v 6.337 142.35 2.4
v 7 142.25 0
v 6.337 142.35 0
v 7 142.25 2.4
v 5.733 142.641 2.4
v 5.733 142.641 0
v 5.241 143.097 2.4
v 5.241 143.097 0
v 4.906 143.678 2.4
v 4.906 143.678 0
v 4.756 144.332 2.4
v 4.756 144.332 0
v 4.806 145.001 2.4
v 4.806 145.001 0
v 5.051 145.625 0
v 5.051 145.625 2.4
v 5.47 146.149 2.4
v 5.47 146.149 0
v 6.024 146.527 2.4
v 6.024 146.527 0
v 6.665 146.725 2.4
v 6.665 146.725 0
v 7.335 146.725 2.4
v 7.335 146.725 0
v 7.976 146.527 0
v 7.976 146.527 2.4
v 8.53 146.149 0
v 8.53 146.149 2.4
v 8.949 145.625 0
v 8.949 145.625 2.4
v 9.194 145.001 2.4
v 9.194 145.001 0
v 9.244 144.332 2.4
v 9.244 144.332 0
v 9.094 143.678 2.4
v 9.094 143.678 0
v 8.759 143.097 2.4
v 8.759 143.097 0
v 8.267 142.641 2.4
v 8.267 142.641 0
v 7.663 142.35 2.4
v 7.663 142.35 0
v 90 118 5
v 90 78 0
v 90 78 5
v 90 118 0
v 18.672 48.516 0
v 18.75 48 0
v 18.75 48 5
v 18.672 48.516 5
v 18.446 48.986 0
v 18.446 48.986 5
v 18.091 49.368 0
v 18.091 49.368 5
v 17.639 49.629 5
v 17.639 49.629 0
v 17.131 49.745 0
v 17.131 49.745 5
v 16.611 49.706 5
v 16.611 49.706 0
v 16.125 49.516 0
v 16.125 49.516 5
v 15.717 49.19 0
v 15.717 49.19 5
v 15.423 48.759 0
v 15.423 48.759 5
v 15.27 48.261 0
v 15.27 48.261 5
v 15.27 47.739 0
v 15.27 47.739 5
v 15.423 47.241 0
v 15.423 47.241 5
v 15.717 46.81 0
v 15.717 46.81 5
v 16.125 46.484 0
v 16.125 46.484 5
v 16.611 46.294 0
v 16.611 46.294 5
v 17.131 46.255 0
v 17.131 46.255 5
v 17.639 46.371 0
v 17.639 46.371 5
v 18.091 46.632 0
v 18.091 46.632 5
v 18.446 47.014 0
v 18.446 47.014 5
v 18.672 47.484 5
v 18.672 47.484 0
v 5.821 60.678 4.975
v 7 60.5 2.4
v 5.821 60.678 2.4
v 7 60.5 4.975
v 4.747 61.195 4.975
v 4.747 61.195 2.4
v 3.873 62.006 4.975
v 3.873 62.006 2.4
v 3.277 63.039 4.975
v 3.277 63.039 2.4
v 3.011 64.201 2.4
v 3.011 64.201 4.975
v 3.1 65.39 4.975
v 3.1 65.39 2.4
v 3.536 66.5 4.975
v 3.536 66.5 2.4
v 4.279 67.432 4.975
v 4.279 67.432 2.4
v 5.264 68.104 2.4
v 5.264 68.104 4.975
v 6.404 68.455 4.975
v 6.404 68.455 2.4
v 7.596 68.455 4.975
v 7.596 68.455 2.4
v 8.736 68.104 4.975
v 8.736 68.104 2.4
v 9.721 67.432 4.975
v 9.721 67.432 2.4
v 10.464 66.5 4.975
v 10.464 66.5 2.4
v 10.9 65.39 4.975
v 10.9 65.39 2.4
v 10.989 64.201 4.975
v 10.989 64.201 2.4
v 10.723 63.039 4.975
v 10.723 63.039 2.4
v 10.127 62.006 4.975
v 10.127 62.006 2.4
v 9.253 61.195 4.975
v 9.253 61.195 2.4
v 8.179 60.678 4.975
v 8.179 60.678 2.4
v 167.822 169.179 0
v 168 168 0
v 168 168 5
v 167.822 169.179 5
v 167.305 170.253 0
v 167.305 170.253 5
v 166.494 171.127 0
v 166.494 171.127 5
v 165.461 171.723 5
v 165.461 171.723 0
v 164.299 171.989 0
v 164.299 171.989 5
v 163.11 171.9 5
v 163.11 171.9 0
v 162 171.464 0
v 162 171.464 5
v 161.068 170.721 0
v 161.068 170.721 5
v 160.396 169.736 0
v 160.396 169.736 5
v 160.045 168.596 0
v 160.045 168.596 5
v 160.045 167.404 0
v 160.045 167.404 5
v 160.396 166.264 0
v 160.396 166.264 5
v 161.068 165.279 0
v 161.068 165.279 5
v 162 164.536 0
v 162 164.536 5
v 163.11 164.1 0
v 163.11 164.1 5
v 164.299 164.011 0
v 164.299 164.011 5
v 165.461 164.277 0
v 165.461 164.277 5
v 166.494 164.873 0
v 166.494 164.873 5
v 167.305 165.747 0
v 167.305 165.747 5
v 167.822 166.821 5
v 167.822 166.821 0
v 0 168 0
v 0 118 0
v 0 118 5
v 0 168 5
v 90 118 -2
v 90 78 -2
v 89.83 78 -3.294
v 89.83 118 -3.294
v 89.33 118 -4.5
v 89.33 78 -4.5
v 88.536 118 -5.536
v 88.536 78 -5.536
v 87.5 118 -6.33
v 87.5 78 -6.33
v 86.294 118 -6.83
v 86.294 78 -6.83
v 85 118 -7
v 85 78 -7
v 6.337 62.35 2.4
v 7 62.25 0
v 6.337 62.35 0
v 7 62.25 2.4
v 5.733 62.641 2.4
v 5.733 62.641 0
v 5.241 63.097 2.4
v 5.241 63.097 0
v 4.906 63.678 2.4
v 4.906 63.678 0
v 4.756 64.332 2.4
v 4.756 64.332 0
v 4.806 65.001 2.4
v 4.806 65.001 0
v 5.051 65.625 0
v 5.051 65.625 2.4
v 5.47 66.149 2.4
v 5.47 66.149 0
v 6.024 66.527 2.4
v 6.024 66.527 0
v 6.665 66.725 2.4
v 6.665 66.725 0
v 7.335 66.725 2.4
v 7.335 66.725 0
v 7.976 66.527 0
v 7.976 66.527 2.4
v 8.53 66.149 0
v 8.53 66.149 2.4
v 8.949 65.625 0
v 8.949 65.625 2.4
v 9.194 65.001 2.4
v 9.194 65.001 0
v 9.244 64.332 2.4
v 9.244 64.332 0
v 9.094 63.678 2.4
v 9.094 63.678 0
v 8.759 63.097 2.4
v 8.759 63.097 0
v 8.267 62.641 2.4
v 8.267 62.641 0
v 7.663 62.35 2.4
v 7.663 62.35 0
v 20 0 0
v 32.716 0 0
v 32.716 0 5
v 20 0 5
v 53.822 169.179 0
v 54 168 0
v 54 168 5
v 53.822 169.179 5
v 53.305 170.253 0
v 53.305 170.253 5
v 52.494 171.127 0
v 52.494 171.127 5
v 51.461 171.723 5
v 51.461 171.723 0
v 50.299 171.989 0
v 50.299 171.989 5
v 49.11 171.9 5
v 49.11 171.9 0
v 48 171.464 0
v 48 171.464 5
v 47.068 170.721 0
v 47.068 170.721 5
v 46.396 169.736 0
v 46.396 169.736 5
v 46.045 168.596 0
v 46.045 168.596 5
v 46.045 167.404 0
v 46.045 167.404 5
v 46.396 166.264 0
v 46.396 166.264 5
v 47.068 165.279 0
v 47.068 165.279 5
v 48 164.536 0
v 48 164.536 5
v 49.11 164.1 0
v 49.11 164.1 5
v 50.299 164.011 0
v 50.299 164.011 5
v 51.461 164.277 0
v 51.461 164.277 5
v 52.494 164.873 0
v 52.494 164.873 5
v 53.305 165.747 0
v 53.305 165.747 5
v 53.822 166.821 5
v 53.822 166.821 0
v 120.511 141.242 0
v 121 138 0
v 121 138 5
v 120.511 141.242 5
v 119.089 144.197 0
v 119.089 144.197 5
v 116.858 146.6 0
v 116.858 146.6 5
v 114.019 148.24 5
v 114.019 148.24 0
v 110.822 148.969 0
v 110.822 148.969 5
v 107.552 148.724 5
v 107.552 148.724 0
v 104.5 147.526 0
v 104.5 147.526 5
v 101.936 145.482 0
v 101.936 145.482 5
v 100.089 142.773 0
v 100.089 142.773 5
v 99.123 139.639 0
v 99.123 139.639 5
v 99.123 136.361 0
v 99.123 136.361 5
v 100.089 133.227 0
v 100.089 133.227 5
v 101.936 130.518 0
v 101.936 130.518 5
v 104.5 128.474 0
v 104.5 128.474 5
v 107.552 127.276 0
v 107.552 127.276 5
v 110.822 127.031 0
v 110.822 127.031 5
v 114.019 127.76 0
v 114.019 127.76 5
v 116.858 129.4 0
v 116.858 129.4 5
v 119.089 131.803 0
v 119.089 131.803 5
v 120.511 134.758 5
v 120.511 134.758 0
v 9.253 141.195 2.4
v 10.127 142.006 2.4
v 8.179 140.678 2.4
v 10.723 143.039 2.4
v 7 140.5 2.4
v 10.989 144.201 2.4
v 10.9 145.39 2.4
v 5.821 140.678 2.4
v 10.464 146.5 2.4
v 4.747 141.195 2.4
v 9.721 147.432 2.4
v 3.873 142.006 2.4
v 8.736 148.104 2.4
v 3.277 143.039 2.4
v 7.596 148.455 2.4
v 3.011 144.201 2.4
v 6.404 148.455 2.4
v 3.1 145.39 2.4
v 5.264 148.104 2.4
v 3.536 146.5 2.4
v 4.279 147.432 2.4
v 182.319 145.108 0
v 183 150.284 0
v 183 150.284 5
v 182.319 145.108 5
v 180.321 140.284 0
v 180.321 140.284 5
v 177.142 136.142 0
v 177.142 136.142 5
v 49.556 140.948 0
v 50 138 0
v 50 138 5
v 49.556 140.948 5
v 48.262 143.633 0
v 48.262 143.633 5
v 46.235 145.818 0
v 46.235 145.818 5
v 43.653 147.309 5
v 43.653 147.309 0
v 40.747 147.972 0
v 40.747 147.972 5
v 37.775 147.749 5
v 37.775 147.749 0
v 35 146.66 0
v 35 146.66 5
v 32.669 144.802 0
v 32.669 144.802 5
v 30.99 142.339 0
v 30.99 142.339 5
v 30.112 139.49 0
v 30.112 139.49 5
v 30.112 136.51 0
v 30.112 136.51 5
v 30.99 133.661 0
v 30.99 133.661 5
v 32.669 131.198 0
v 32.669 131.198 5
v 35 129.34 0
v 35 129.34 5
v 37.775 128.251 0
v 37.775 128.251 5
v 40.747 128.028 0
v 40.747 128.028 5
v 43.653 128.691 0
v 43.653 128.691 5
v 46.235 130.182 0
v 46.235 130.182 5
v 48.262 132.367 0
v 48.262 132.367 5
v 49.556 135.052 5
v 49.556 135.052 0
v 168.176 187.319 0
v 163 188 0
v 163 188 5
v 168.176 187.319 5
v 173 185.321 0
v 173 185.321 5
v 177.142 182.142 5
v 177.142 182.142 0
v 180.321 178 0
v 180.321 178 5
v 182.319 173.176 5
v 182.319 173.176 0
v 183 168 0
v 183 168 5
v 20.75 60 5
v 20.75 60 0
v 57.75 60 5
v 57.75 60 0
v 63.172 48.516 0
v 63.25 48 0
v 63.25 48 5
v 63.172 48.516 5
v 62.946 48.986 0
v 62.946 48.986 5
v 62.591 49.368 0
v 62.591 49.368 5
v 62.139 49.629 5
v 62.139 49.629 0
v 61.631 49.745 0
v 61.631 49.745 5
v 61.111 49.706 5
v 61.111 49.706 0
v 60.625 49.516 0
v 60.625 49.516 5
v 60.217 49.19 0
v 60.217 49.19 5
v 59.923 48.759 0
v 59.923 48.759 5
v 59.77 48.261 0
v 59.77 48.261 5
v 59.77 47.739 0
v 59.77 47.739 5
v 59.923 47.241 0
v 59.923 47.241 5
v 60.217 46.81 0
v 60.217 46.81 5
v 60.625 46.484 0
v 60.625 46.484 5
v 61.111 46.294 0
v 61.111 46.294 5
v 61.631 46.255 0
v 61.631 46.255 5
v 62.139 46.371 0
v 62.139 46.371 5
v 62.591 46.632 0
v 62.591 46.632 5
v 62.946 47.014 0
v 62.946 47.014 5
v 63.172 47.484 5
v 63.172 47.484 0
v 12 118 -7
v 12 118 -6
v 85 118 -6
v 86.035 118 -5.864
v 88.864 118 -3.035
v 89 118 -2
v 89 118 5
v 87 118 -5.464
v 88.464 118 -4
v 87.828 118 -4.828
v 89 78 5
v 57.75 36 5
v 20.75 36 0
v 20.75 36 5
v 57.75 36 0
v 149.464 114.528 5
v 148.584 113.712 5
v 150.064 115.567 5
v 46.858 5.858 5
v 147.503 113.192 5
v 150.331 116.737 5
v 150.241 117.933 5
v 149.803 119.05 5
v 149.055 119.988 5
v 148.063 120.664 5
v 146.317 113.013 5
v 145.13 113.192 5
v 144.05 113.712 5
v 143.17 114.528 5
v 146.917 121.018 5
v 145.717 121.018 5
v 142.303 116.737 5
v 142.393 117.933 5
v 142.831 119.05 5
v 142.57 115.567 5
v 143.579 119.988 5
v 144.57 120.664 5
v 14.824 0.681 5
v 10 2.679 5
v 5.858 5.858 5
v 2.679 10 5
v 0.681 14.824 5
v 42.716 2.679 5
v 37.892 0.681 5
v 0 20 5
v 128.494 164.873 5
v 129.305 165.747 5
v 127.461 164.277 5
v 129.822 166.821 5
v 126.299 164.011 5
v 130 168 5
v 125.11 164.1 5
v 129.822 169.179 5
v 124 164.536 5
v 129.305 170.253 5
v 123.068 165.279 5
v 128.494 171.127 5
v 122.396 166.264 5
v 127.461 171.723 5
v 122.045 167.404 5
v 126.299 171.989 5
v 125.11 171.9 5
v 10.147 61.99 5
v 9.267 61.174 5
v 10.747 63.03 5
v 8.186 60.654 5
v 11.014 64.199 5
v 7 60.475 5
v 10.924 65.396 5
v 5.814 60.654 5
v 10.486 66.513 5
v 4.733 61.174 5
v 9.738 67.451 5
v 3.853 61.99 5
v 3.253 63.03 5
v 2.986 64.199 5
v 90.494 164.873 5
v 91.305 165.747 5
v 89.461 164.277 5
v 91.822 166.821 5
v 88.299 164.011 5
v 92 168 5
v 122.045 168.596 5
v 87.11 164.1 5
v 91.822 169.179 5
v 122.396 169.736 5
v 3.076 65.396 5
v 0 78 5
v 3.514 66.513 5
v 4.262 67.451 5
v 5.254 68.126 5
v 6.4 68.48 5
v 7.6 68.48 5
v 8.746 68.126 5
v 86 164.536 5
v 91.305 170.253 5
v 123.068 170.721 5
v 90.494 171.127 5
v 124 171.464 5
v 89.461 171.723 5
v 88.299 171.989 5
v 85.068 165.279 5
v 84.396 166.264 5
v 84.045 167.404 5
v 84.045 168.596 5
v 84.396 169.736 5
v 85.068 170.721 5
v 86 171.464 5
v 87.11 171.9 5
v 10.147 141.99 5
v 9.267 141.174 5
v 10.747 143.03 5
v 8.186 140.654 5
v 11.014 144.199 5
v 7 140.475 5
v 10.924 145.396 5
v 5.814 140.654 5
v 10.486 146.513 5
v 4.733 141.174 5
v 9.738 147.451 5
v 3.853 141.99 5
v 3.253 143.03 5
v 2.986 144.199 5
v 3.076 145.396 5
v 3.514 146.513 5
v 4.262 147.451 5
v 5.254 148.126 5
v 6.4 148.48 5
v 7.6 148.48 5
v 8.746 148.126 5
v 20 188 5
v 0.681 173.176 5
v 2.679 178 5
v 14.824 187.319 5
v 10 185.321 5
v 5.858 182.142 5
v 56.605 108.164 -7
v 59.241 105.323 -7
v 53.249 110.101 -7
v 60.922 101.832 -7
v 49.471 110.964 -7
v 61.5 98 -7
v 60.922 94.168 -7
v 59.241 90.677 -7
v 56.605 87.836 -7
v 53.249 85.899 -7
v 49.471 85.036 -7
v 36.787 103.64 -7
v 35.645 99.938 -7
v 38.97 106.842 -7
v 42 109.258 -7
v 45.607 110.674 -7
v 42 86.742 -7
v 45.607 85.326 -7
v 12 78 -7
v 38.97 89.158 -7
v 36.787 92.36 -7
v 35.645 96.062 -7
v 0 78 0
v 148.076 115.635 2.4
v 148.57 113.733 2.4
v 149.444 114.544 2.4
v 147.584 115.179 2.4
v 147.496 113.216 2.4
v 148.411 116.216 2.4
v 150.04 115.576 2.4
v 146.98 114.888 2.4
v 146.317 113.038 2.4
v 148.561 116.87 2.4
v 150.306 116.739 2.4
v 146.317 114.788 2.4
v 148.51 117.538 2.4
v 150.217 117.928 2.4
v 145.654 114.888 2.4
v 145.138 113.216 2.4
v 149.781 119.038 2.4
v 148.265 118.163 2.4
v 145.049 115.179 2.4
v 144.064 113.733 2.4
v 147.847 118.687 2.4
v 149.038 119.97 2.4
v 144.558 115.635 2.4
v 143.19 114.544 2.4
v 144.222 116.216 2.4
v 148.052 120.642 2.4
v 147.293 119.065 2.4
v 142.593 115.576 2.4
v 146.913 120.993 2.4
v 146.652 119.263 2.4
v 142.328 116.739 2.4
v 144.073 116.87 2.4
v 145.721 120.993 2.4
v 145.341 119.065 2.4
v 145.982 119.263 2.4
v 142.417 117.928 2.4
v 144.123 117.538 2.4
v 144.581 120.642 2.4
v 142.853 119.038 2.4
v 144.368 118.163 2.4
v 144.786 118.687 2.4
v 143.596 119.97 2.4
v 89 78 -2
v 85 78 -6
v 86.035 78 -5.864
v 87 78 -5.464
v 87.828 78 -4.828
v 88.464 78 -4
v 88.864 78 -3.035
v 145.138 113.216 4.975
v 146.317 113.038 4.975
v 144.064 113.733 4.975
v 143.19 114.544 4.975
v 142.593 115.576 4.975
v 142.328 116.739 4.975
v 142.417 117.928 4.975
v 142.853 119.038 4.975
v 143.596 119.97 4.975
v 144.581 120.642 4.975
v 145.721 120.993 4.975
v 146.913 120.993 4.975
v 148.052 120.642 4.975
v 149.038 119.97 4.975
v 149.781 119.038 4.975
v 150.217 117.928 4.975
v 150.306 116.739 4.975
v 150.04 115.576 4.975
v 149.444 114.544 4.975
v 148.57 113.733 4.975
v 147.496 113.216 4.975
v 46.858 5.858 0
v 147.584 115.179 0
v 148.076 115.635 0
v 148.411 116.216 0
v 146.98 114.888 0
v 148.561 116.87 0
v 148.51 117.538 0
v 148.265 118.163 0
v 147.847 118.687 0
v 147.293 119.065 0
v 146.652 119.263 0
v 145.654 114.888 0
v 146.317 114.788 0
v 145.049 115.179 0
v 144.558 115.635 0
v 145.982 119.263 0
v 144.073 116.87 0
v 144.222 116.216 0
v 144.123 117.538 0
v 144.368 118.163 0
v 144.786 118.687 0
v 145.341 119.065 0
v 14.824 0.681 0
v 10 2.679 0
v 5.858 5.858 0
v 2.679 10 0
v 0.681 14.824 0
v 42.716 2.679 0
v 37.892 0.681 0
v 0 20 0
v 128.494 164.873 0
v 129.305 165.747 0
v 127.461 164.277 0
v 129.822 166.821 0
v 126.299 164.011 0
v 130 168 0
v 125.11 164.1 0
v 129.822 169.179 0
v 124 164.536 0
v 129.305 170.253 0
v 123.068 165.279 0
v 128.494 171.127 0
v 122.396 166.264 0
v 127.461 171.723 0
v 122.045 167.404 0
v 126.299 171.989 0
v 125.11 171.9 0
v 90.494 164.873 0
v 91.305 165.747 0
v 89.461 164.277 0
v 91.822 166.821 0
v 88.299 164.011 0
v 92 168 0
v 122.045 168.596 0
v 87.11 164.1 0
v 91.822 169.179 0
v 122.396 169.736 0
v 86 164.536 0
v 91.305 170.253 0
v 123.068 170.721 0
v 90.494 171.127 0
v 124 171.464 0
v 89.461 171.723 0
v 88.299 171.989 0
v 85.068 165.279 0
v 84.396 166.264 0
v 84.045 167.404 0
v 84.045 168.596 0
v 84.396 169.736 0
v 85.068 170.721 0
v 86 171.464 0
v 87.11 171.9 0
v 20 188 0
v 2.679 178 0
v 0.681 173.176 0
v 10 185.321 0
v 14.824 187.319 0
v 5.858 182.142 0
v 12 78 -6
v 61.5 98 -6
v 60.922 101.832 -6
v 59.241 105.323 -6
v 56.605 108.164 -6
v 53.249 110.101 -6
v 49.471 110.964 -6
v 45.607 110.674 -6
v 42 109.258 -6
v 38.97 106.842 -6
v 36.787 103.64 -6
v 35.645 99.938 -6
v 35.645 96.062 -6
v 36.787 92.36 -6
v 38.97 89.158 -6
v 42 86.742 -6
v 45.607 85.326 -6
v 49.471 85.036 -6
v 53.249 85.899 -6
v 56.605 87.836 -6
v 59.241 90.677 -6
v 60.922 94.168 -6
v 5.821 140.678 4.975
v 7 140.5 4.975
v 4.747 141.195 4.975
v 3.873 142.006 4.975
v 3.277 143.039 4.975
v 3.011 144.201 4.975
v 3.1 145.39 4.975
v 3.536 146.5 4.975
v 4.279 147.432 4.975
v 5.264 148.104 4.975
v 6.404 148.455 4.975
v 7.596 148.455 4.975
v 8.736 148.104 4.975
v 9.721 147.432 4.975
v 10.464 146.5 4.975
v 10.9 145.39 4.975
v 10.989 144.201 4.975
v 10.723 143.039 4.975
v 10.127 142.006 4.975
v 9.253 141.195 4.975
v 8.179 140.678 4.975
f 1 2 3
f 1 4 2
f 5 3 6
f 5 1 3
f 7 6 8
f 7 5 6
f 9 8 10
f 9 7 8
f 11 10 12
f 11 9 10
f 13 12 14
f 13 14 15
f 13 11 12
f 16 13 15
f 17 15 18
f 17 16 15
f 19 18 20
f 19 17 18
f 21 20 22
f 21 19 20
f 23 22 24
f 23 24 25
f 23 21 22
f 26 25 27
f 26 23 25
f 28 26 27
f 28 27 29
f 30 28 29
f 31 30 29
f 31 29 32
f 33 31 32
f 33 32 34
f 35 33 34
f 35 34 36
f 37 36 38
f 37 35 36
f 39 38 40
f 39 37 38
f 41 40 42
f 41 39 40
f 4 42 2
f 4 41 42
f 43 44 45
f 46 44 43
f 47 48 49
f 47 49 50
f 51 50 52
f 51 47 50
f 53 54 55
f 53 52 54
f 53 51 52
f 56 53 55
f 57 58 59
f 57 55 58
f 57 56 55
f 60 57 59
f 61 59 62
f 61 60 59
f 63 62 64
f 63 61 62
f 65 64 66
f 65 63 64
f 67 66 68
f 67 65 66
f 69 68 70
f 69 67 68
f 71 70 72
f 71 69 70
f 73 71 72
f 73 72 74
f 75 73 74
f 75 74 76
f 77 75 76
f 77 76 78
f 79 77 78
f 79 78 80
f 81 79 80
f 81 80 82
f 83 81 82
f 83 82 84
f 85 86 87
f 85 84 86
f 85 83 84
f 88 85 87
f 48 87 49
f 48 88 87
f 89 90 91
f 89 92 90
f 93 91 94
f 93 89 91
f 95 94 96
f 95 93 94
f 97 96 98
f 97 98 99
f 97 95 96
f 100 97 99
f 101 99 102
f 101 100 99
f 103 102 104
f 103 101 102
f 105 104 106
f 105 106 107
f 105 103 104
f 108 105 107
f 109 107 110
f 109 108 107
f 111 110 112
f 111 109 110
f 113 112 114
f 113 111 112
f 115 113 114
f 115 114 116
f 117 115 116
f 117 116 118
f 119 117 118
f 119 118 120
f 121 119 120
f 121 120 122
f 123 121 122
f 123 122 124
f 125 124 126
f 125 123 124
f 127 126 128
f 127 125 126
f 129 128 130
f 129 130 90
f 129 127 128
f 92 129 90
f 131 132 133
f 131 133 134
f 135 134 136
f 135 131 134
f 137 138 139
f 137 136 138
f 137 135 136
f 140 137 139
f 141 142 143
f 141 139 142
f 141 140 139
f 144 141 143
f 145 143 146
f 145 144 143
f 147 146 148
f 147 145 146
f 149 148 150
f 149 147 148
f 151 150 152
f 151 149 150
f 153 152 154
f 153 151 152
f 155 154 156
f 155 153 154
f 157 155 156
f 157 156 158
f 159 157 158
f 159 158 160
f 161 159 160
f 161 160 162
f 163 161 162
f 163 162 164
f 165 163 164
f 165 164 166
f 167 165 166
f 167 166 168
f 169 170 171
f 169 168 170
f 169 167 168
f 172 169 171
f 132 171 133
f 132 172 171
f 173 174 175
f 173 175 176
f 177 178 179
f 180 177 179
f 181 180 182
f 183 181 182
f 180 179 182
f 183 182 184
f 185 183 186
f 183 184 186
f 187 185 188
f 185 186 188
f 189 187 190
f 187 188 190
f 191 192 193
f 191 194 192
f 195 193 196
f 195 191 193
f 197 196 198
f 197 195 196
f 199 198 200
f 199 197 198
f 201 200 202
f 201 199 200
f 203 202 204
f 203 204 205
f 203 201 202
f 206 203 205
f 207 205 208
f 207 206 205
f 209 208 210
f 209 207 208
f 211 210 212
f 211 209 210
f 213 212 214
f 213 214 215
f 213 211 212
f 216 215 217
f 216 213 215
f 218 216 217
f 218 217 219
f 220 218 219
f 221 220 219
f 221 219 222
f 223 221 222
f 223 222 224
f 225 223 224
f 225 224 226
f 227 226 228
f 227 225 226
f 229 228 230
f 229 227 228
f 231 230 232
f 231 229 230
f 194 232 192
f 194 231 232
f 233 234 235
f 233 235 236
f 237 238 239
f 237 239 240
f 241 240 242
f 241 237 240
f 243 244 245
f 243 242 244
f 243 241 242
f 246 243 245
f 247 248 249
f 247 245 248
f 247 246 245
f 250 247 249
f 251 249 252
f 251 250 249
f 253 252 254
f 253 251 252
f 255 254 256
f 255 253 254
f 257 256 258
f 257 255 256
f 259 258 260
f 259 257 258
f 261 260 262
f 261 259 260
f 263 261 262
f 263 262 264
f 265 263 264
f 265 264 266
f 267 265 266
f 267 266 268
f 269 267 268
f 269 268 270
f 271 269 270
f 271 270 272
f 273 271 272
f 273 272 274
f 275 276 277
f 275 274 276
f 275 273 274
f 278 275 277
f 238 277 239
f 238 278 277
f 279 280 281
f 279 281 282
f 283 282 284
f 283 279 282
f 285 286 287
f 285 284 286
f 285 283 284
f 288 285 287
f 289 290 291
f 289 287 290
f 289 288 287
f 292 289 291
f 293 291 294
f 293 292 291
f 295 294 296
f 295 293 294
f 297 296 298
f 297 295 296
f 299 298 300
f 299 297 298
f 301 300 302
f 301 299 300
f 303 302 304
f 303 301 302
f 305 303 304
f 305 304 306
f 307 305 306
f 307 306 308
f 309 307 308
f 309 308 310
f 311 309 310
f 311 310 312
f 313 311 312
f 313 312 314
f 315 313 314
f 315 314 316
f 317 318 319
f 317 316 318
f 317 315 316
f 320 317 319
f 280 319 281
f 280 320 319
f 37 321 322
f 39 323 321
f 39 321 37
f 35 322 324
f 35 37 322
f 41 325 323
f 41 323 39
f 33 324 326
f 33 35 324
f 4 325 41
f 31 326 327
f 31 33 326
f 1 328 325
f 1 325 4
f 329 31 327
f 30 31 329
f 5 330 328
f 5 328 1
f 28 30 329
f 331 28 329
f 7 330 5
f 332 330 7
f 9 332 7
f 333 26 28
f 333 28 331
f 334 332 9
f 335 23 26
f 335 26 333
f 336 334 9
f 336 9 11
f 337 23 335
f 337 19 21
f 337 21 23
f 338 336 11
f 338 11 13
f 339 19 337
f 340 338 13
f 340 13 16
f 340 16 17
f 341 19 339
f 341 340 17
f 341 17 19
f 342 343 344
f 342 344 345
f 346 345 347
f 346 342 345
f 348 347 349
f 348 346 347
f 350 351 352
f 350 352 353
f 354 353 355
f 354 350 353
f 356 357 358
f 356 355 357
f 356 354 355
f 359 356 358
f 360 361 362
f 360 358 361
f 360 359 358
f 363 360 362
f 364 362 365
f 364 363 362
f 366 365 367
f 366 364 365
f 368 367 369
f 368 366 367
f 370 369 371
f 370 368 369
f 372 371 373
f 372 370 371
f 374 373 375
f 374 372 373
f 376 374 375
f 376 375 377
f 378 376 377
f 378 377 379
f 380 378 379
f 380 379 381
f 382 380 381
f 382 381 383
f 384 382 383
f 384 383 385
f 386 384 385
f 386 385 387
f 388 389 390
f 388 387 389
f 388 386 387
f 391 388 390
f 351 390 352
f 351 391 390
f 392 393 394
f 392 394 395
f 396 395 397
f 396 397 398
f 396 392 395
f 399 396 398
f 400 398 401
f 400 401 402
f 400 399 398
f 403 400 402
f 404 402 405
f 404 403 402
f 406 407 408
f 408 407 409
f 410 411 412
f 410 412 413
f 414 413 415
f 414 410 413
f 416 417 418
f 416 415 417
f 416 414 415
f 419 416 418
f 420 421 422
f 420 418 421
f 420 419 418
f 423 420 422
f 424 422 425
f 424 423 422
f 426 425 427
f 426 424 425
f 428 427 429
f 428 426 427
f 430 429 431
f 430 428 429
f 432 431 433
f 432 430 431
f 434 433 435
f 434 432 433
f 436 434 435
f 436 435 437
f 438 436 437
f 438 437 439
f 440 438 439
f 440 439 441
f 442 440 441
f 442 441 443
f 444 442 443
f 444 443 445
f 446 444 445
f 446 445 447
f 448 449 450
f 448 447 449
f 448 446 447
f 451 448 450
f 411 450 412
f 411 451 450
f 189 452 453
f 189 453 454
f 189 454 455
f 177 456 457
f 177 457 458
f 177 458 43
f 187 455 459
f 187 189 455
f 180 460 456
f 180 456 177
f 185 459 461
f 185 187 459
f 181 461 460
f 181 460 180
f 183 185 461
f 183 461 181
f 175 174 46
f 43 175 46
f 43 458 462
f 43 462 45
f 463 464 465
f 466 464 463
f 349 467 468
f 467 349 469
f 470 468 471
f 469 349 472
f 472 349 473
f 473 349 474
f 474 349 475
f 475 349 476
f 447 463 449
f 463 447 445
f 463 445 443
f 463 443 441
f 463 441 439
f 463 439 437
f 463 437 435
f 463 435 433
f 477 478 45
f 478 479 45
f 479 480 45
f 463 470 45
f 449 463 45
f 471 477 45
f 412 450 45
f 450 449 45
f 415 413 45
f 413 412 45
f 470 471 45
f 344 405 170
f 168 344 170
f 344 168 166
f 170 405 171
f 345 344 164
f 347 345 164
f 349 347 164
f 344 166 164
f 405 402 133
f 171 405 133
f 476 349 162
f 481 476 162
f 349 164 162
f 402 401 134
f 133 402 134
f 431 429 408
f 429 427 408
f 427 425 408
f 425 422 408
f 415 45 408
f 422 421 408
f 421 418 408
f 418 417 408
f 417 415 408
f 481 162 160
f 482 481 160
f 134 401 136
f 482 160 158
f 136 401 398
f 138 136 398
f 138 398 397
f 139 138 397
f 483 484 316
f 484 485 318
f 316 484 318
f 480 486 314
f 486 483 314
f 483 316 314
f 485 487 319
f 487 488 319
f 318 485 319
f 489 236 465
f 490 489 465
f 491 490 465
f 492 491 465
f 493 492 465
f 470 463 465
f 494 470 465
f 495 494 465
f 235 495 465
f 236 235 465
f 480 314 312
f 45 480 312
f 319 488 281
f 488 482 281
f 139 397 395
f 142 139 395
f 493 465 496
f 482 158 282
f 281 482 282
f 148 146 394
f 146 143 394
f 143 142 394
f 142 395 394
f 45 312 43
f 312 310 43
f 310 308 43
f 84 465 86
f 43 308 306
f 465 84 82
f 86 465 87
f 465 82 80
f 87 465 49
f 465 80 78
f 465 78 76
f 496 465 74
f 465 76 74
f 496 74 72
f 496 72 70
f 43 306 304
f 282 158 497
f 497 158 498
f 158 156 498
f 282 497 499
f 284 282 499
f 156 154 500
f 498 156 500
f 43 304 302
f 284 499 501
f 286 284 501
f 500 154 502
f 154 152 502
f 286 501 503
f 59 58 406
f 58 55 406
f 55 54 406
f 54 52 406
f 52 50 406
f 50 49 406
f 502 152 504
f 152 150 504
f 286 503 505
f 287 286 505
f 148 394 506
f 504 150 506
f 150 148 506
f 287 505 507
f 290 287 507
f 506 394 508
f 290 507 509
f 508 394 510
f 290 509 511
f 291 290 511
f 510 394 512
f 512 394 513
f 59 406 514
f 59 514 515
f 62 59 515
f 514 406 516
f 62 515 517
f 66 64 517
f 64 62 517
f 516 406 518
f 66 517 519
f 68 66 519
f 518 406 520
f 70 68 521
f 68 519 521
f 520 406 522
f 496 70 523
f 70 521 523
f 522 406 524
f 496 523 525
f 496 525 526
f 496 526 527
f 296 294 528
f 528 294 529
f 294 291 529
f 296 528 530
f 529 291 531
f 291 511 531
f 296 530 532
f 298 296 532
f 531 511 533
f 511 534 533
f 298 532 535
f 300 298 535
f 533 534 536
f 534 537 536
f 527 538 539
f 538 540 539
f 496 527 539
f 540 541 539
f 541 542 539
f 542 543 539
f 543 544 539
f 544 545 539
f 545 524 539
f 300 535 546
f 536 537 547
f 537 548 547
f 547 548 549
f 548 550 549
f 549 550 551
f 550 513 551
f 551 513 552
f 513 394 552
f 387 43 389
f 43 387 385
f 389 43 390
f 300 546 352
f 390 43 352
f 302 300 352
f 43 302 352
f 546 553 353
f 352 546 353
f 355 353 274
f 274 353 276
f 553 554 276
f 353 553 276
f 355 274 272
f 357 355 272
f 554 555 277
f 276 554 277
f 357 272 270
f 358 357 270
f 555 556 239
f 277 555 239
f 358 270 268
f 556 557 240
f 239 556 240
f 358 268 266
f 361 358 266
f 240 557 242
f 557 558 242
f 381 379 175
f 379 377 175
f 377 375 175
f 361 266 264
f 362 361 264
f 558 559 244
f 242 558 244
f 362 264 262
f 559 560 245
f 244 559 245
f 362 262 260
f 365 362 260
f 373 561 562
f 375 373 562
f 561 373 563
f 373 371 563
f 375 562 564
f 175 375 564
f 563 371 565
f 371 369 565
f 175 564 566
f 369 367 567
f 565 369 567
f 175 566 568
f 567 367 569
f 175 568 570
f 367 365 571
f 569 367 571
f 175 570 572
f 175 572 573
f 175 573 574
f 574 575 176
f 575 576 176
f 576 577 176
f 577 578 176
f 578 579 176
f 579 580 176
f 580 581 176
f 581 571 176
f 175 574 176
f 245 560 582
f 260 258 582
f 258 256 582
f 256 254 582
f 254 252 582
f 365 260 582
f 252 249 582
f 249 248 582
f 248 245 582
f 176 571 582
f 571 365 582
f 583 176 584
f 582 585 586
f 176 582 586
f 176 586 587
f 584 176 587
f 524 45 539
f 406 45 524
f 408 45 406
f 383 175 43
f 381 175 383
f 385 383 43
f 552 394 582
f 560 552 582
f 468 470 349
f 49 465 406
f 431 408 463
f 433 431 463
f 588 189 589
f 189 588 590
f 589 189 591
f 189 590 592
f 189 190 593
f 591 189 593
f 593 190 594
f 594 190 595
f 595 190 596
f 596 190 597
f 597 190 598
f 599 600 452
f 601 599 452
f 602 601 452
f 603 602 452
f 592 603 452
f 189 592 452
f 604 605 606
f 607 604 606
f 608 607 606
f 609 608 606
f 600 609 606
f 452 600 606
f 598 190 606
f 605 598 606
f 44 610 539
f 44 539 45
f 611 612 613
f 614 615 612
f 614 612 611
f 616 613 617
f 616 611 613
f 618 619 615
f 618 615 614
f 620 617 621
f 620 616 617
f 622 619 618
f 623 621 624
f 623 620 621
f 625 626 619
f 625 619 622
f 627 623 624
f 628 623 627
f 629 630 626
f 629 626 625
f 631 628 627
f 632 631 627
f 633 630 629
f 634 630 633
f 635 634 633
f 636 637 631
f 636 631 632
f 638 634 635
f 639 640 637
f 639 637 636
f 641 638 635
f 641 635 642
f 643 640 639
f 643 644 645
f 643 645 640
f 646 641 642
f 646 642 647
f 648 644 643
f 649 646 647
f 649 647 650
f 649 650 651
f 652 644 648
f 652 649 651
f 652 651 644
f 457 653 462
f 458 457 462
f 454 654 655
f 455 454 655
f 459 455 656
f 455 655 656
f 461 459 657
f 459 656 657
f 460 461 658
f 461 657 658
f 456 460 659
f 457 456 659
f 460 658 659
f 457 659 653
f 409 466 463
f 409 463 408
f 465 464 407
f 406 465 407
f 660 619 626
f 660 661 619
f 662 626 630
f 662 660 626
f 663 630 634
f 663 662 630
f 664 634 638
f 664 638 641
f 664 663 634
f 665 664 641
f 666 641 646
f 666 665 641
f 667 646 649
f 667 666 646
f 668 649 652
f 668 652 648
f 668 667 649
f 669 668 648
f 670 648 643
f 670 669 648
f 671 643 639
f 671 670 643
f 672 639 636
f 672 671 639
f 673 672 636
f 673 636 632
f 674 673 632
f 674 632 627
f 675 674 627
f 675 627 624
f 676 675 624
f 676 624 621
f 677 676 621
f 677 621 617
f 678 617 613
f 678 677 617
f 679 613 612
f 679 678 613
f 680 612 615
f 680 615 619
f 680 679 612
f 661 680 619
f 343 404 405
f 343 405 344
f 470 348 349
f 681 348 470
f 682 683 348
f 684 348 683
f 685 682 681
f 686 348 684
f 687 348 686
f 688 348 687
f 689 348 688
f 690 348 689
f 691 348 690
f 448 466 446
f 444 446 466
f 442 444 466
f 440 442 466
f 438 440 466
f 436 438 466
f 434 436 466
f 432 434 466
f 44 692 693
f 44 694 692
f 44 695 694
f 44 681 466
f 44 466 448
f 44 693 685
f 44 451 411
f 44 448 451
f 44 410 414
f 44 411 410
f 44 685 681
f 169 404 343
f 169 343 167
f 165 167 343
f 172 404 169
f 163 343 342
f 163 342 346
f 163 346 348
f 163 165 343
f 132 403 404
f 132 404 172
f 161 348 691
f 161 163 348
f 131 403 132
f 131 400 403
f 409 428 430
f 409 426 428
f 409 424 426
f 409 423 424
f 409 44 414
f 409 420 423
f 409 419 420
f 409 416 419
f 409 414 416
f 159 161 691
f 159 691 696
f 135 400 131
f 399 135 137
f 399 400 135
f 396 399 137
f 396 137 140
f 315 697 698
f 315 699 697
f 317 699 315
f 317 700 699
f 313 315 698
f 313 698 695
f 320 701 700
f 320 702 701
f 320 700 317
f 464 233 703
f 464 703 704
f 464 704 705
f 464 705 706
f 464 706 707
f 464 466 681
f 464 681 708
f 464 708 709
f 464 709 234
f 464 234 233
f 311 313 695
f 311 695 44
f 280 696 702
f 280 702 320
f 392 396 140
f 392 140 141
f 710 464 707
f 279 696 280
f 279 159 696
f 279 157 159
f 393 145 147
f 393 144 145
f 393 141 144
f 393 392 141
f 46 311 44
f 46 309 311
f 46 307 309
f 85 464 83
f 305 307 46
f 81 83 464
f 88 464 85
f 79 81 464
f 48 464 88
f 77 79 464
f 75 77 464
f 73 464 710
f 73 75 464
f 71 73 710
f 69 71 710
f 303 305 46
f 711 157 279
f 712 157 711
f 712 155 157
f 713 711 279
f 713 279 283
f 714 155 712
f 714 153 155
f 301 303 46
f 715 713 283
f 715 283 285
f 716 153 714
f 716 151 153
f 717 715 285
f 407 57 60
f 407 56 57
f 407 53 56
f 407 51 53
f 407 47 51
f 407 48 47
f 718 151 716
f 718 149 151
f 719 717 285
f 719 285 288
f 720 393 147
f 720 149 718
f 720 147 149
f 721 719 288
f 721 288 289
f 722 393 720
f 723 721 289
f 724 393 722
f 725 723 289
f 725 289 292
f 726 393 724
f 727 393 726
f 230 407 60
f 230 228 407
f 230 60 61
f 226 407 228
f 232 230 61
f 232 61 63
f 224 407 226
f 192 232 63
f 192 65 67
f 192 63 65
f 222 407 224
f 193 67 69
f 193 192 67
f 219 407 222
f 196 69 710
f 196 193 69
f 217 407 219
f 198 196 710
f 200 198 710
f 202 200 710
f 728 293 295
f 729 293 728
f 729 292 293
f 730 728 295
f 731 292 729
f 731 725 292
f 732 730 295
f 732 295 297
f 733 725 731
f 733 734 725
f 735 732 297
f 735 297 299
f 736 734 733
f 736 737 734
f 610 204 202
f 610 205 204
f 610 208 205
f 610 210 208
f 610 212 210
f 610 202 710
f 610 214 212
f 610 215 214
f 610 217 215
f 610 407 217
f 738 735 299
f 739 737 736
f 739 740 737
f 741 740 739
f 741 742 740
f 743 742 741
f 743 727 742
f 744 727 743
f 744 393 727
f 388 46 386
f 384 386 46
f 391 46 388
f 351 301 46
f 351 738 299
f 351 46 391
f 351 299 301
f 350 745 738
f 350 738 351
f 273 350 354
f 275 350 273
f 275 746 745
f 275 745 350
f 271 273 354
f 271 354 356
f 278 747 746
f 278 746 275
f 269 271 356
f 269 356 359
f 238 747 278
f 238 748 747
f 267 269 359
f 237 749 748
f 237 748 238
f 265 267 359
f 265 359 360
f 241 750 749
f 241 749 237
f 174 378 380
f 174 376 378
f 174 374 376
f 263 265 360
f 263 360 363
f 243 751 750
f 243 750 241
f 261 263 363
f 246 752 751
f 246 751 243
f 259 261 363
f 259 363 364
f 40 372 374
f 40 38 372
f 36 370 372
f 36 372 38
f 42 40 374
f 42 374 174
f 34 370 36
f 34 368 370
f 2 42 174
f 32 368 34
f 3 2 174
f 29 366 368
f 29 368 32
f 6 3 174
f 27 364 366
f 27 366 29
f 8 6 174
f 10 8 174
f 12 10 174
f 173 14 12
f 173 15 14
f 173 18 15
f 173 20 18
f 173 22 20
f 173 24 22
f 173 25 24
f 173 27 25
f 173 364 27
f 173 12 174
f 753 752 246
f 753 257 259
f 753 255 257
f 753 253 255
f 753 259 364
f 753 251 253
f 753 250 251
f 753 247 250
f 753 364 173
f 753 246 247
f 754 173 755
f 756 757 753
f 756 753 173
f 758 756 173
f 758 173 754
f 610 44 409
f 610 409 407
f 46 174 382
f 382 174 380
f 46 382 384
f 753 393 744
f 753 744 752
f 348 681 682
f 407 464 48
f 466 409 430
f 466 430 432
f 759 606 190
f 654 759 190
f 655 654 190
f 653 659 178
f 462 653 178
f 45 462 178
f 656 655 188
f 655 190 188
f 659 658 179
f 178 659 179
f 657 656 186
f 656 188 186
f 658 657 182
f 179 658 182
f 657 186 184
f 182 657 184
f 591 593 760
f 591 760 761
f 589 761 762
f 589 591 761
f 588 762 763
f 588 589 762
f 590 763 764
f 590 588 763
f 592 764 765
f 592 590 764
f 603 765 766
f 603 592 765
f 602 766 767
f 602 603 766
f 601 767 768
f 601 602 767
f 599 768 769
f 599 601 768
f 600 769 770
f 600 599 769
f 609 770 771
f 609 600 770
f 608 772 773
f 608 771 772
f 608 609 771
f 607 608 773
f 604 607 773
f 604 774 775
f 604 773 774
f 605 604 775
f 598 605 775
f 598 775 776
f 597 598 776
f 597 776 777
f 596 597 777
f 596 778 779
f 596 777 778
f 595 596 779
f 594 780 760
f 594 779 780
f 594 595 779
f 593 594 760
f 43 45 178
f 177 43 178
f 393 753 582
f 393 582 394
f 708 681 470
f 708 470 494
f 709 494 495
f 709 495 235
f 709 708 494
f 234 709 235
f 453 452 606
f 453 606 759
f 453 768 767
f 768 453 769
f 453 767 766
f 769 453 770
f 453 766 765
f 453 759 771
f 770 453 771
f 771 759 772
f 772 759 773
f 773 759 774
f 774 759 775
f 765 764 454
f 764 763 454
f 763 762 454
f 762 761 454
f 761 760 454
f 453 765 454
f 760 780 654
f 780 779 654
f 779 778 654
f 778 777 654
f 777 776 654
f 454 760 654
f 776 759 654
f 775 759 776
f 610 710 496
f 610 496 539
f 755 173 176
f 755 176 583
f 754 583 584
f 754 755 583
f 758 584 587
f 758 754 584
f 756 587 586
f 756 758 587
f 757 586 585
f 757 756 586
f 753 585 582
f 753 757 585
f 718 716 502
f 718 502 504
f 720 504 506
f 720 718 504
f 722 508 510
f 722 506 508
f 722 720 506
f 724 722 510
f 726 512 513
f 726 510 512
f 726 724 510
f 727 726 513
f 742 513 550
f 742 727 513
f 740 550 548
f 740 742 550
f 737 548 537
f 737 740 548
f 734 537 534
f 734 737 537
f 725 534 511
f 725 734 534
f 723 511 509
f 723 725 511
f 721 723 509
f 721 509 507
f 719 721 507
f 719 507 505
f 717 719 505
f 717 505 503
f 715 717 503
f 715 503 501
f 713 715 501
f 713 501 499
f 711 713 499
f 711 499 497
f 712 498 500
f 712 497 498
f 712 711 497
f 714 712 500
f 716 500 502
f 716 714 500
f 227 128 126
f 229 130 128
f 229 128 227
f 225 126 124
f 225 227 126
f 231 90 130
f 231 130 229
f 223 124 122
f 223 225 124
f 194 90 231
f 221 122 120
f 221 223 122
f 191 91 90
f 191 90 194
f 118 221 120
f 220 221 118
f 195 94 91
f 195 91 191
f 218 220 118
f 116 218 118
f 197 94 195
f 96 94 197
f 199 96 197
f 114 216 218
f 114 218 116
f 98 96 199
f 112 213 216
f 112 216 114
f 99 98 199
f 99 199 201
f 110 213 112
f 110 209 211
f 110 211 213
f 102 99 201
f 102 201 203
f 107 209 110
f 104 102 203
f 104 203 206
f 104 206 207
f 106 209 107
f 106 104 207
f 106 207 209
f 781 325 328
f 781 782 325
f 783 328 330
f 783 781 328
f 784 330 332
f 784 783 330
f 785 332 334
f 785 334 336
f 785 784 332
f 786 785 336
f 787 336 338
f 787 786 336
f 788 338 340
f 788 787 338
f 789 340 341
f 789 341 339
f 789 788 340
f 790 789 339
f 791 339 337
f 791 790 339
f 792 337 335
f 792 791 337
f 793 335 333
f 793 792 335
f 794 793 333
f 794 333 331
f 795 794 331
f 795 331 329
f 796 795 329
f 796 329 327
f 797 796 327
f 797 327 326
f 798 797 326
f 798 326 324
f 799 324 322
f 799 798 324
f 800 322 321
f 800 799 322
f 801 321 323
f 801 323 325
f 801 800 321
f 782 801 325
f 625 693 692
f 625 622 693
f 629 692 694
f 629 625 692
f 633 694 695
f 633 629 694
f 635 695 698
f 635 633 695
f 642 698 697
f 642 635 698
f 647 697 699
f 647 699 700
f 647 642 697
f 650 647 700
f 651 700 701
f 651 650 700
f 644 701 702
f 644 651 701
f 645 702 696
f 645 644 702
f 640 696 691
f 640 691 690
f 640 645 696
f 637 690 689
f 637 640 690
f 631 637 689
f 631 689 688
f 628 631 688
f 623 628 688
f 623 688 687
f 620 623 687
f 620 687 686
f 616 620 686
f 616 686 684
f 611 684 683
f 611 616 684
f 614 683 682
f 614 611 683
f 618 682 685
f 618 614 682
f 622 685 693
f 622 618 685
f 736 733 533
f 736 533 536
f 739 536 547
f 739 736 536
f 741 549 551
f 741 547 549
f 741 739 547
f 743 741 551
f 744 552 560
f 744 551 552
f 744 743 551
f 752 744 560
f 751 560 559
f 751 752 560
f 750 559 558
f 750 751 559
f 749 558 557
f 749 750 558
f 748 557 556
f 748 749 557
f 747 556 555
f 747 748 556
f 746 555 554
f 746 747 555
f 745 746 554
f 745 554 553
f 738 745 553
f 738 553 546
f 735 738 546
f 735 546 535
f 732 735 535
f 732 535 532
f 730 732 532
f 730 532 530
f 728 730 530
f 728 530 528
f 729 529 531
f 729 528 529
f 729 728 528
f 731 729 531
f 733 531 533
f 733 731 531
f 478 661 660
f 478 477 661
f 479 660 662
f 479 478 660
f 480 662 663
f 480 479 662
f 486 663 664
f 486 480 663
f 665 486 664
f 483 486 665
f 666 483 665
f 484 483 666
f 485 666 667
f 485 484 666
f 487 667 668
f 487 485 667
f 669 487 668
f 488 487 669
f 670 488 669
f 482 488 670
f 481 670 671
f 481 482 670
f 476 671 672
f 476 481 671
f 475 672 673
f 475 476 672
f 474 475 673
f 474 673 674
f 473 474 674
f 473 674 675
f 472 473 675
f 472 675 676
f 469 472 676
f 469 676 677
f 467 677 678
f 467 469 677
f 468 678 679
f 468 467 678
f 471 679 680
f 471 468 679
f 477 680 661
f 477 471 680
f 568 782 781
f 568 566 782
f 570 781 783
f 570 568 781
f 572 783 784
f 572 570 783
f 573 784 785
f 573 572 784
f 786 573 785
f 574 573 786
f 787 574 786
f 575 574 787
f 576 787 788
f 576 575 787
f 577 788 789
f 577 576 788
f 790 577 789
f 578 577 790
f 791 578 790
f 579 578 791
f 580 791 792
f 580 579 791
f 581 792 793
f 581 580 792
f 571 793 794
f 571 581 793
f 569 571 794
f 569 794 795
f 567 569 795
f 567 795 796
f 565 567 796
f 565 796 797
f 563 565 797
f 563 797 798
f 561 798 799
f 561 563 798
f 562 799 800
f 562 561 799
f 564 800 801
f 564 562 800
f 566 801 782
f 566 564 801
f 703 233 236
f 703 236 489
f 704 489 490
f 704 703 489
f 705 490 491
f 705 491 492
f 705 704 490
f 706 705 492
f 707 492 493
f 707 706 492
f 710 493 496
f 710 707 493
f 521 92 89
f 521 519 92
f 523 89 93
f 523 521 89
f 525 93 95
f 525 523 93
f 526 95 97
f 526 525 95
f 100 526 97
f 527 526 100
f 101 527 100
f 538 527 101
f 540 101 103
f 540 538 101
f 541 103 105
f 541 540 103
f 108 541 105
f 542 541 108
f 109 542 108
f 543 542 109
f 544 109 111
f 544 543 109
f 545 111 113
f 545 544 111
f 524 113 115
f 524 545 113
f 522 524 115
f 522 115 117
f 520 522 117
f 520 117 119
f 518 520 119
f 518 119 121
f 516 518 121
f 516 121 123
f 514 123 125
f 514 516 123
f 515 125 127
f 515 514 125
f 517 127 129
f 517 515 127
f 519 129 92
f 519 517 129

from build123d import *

# Parameters (mm, degrees)
ESTRUSIONE_ESTRUSIONE1_DEPTH                 = 5
FORO_LAMATO_PER_VITE_M4_A_TESTA_CILI_2_COUNT = 2
FORO_LAMATO_PER_VITE_M4_A_TESTA_CILI_2_PITCH = 80
FORO_LAMATO_PER_VITE_M4_A_TESTA_CILI_3_COUNT = 2
FORO_LAMATO_PER_VITE_M4_A_TESTA_CILI_3_PITCH = 141.997761326
TAGLIO_ESTRUSIONE1_DEPTH                     = 263.408079144
TAGLIO_ESTRUSIONE1_DEPTH_BACK                = 263.408079144
SCHIZZO5_R                                   = 1.75
SCHIZZO5_R_2                                 = 10
SCHIZZO5_R_3                                 = 11
SCHIZZO5_R_4                                 = 4
SCHIZZO5_W                                   = 37
SCHIZZO5_H                                   = 24
TAGLIO_ESTRUSIONE2_DEPTH                     = 263.408079144
TAGLIO_ESTRUSIONE2_DEPTH_BACK                = 263.408079144
SCHIZZO7_W                                   = 90
SCHIZZO7_H                                   = 40
FLANGIA_START                                = 78
FLANGIA_CON_SWEEP3_DEPTH                     = 40
TAGLIO_ESTRUSIONE3_DEPTH                     = 263.59093663
TAGLIO_ESTRUSIONE3_DEPTH_BACK                = 263.59093663
SCHIZZO23_R                                  = 13


# Read off the part's stored shape, not the designer's step: Flangia con sweep3
with BuildPart() as part:
    # Schizzo1 → Estrusione-Estrusione1 (new body)
    with BuildSketch(Plane.XY):
        with BuildLine():
            Line((0, 20), (0, 168))
            ThreePointArc((0, 168), (5.857864376, 182.142135624), (20, 188))
            Line((20, 188), (163, 188))
            ThreePointArc((163, 188), (177.142135624, 182.142135624), (183, 168))
            Line((183, 168), (183, 150.284271247))
            ThreePointArc((183, 150.284271247), (181.47759065, 142.6306026), (177.142135624, 136.142135624))
            Line((177.142135624, 136.142135624), (46.857864376, 5.857864376))
            ThreePointArc((46.857864376, 5.857864376), (40.3693974, 1.52240935), (32.715728753, 0))
            Line((32.715728753, 0), (20, 0))
            ThreePointArc((20, 0), (5.857864376, 5.857864376), (0, 20))
        make_face()
    extrude(amount=ESTRUSIONE_ESTRUSIONE1_DEPTH)

    # Schizzo4 → Foro lamato per Vite M4 a testa cilindrica piana-1 (revolve, cut)
    with BuildSketch(Plane(origin=(7, 144.5, 5), x_dir=(0, -1, 0), z_dir=(1, 0, 0))):
        Polygon((0, 0), (0, 5), (2.25, 5), (2.25, 2.6), (4, 2.6), (4, 0.025), (4.025, 0), align=None)
    foro_lamato_per_vite_m4_a_testa_cilindri = revolve(axis=Axis((7, 144.5, 11.35), (0, 0, -1)), mode=Mode.SUBTRACT)

    # Foro lamato per Vite M4 a testa cili 2: Foro lamato per Vite M4 a testa cilindrica piana-1 ×2
    with Locations(*[(0, -i * FORO_LAMATO_PER_VITE_M4_A_TESTA_CILI_2_PITCH, 0) for i in range(1, FORO_LAMATO_PER_VITE_M4_A_TESTA_CILI_2_COUNT)]):
        add(foro_lamato_per_vite_m4_a_testa_cilindri, mode=Mode.SUBTRACT)

    # Foro lamato per Vite M4 a testa cili 3: Foro lamato per Vite M4 a testa cilindrica piana-1 ×2
    with Locations(*[Vector(0.98112021612507, -0.19339886636352308, 0) * (i * FORO_LAMATO_PER_VITE_M4_A_TESTA_CILI_3_PITCH) for i in range(1, FORO_LAMATO_PER_VITE_M4_A_TESTA_CILI_3_COUNT)]):
        add(foro_lamato_per_vite_m4_a_testa_cilindri, mode=Mode.SUBTRACT)

    # Schizzo5 → Taglio-Estrusione1 (cut, two sides: drawn at the far end of the back side and taken through both)
    with BuildSketch(Plane.XY.offset(5).offset(-TAGLIO_ESTRUSIONE1_DEPTH_BACK)):
        with Locations((17, 48)):
            Circle(SCHIZZO5_R)
        with Locations((61.5, 48)):
            Circle(SCHIZZO5_R)
        with Locations((40, 138)):
            Circle(SCHIZZO5_R_2)
        with Locations((110, 138)):
            Circle(SCHIZZO5_R_3)
        with Locations((50, 168)):
            Circle(SCHIZZO5_R_4)
        with Locations((88, 168)):
            Circle(SCHIZZO5_R_4)
        with Locations((126, 168)):
            Circle(SCHIZZO5_R_4)
        with Locations((164, 168)):
            Circle(SCHIZZO5_R_4)
        with Locations((39.25, 48)):
            Rectangle(SCHIZZO5_W, SCHIZZO5_H)
    extrude(amount=TAGLIO_ESTRUSIONE1_DEPTH + TAGLIO_ESTRUSIONE1_DEPTH_BACK, mode=Mode.SUBTRACT)

    # Schizzo7 → Taglio-Estrusione2 (cut, two sides: drawn at the far end of the back side and taken through both)
    with BuildSketch(Plane.XY.offset(5).offset(-TAGLIO_ESTRUSIONE2_DEPTH_BACK)):
        with Locations((45, 98)):
            Rectangle(SCHIZZO7_W, SCHIZZO7_H)
    extrude(amount=TAGLIO_ESTRUSIONE2_DEPTH + TAGLIO_ESTRUSIONE2_DEPTH_BACK, mode=Mode.SUBTRACT)


with BuildPart() as body_2:
    # Flangia con sweep3 outline → Flangia con sweep3 (new body)
    with BuildSketch(Plane(origin=(0, 0, 0), x_dir=(1, 0, 0), z_dir=(0, 1, 0)).offset(FLANGIA_START)):
        with BuildLine():
            Line((85, 7), (12, 7))
            Line((12, 7), (12, 6))
            Line((12, 6), (85, 6))
            ThreePointArc((85, 6), (87.828427125, 4.828427125), (89, 2))
            Line((89, 2), (89, -5))
            Line((89, -5), (90, -5))
            Line((90, -5), (90, 2))
            ThreePointArc((90, 2), (88.535533906, 5.535533906), (85, 7))
        make_face()
    extrude(amount=FLANGIA_CON_SWEEP3_DEPTH)

    # Schizzo23 → Taglio-Estrusione3 (cut, two sides: drawn at the far end of the back side and taken through both)
    with BuildSketch(Plane.XY.offset(-6).offset(-TAGLIO_ESTRUSIONE3_DEPTH_BACK)):
        with Locations((48.5, 98)):
            Circle(SCHIZZO23_R)
    extrude(amount=TAGLIO_ESTRUSIONE3_DEPTH + TAGLIO_ESTRUSIONE3_DEPTH_BACK, mode=Mode.SUBTRACT)


solid = Compound([part.part, body_2.part])
